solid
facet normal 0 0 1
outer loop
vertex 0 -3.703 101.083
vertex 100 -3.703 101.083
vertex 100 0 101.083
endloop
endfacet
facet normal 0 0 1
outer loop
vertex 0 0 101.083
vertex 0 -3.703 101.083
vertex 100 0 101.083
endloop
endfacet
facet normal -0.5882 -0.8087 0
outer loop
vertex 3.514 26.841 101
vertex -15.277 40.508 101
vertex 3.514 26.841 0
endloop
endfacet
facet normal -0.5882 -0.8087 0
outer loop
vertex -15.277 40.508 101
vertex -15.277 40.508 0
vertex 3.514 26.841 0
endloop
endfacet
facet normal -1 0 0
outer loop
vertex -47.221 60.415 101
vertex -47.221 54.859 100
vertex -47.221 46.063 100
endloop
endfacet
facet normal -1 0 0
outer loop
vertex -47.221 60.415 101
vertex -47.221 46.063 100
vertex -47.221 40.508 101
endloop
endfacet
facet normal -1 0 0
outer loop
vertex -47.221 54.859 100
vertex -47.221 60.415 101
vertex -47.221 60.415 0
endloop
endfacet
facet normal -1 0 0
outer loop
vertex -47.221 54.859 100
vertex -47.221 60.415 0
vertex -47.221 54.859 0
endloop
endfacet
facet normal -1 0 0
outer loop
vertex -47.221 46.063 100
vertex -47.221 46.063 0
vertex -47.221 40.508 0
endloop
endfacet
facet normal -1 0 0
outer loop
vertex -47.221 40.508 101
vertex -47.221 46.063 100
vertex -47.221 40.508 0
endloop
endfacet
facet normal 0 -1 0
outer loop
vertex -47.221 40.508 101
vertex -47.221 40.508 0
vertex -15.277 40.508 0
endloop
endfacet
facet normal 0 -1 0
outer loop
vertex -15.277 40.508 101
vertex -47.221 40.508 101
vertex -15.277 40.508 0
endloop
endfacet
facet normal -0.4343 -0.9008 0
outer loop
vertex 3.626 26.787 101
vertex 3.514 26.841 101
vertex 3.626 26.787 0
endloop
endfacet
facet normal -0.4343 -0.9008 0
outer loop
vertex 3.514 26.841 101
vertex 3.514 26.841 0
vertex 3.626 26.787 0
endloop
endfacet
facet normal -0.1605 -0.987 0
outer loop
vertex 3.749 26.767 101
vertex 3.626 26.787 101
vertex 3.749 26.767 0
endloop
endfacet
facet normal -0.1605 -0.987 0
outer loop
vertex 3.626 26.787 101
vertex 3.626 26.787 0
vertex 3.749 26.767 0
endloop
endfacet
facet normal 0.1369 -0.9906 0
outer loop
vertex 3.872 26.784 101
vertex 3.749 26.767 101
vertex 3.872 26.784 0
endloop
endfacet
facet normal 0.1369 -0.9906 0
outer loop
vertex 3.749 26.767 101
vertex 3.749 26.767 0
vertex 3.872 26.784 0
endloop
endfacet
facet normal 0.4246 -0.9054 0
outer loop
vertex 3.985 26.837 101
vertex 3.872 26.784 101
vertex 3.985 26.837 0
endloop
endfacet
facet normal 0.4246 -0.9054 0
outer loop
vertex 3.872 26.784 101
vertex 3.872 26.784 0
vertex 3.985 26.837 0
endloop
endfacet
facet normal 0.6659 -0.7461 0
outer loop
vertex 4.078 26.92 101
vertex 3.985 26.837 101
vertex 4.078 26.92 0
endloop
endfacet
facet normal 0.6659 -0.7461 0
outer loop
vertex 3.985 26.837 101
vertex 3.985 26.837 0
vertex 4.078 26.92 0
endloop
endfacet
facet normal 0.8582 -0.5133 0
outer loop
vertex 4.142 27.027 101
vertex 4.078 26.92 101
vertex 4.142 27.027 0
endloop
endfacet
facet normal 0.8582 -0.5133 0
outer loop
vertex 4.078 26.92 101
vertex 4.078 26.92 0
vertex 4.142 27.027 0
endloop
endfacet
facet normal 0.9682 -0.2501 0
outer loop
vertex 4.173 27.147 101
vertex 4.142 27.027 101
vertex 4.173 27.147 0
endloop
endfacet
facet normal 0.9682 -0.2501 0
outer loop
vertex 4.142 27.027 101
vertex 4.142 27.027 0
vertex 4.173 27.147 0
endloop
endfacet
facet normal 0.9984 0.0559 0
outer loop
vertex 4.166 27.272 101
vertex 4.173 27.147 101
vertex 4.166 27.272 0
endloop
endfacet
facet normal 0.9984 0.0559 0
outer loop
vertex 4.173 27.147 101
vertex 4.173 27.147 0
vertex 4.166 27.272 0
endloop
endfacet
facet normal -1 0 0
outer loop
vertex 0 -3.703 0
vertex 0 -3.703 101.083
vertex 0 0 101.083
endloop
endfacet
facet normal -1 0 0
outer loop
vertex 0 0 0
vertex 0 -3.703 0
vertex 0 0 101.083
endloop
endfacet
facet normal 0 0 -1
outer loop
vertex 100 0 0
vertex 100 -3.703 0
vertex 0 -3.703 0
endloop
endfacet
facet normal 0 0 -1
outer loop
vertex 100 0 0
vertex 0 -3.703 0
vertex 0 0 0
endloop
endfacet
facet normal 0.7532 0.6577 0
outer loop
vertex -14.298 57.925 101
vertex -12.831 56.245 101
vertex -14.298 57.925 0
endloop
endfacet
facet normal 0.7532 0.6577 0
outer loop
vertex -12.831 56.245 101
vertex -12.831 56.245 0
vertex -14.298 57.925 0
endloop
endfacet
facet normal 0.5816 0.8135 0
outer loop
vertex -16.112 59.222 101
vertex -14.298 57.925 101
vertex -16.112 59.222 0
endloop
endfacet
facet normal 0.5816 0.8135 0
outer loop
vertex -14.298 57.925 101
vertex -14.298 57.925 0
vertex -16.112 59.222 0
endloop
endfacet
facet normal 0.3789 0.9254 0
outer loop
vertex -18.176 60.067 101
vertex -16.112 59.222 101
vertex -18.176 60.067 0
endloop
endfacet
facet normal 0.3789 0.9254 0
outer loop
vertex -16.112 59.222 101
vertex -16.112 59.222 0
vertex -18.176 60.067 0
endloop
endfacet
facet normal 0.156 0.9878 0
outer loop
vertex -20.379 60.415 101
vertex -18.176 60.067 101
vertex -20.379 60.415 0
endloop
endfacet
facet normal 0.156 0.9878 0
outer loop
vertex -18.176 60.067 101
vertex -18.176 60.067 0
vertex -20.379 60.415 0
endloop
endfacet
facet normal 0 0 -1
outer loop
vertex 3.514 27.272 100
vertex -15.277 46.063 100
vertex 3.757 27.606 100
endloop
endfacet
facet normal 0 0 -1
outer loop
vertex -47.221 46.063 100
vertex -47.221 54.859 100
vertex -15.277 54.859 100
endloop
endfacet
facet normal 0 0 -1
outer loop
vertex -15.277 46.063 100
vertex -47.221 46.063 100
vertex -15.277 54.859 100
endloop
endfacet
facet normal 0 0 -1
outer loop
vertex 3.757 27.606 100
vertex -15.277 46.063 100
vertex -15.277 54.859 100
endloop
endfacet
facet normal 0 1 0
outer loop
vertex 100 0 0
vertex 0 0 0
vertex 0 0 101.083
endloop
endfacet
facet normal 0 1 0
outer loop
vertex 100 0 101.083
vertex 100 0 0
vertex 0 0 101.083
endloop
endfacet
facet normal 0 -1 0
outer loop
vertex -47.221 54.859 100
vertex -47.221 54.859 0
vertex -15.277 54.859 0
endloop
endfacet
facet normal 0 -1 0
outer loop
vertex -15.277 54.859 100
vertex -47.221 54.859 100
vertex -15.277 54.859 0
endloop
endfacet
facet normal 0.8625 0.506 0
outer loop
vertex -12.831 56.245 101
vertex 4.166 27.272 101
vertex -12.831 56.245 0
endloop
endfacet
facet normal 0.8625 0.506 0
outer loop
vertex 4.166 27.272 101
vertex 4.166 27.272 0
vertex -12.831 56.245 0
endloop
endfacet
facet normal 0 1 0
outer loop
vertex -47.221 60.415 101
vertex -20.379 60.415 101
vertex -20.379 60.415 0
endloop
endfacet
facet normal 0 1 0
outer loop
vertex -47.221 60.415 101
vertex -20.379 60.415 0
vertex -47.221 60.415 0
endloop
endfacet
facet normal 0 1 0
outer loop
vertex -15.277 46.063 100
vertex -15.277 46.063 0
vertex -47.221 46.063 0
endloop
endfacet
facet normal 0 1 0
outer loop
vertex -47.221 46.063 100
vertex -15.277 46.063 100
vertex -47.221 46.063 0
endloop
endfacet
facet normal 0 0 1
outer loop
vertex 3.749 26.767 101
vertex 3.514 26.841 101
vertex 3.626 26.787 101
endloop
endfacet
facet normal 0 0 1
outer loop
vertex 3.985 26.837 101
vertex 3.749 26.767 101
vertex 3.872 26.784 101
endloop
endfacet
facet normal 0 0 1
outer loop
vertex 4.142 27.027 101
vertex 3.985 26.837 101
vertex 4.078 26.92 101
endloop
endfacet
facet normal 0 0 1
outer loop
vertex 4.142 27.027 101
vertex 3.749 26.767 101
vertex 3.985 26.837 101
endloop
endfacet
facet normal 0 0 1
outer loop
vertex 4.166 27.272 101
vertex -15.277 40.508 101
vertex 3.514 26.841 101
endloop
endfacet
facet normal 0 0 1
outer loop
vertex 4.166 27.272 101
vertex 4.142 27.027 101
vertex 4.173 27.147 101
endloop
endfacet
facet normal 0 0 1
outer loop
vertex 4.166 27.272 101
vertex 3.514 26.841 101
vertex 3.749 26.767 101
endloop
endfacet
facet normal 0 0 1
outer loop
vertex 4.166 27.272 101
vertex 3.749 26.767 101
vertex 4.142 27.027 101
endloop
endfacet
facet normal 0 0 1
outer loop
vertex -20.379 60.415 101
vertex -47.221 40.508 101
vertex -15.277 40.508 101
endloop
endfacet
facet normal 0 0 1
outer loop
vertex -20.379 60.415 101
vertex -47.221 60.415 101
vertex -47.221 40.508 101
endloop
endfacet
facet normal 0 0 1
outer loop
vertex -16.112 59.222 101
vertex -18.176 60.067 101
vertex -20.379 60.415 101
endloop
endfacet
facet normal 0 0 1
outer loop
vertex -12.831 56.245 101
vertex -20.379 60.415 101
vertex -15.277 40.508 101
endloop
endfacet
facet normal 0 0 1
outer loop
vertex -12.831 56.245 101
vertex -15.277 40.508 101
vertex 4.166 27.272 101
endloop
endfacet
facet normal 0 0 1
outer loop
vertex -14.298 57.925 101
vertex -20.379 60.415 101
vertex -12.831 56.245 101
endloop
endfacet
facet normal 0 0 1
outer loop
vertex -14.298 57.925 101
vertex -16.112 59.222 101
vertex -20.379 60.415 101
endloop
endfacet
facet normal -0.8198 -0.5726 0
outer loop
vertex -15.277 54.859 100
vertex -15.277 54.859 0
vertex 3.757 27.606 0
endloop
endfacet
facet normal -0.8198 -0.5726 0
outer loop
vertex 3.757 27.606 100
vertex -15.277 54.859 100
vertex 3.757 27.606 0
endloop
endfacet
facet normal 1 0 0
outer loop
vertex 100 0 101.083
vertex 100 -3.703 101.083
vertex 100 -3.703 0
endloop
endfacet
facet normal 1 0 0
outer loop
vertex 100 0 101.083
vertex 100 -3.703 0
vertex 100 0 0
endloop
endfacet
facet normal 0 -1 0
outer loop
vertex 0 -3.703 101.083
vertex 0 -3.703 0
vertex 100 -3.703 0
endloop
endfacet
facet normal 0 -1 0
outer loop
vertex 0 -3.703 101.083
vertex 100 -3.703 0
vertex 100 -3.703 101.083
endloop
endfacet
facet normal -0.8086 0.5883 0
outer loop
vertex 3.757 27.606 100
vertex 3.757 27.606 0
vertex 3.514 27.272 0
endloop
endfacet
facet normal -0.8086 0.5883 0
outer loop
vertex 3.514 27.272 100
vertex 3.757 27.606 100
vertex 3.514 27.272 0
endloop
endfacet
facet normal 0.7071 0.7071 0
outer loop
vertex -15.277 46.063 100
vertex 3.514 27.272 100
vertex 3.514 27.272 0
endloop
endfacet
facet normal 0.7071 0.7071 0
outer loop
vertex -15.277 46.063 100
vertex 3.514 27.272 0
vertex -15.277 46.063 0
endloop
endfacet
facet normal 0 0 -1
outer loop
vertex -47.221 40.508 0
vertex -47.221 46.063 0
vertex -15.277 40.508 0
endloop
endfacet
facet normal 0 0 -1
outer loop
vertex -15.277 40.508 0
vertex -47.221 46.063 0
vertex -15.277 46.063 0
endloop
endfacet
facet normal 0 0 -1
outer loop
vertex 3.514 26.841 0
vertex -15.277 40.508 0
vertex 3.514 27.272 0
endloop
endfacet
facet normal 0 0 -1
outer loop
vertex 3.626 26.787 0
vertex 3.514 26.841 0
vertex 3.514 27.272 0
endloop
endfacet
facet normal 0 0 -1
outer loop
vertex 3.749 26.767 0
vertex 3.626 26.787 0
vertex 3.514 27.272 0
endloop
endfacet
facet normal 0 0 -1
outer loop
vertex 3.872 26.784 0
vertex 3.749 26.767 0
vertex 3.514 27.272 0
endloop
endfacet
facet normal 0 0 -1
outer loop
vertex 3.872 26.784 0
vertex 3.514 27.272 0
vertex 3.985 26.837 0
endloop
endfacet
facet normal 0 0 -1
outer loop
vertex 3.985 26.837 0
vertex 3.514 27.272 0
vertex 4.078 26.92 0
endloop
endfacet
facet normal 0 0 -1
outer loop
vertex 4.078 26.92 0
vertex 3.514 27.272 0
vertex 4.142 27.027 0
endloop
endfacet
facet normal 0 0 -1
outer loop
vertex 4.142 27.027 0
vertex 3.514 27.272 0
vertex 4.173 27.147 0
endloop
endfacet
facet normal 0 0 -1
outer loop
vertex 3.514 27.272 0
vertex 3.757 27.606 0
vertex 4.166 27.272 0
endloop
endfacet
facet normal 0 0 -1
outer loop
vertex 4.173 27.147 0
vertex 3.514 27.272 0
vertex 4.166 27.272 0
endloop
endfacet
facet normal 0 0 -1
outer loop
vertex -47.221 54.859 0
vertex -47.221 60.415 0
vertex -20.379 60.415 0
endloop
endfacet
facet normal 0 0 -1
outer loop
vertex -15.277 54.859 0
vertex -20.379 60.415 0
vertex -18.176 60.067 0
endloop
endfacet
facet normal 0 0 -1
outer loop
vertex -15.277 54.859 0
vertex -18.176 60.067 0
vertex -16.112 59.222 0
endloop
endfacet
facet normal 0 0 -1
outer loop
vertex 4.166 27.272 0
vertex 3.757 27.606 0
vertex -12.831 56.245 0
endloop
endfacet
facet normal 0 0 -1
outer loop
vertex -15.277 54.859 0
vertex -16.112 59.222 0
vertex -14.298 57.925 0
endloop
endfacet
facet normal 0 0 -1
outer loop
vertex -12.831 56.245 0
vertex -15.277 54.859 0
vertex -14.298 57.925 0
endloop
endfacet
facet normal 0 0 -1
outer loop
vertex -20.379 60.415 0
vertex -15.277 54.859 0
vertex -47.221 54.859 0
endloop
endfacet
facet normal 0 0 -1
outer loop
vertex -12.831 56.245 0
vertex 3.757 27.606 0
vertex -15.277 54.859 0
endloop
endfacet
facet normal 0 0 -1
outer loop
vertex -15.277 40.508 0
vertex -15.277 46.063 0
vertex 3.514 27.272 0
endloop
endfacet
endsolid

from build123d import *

# Parameters (mm, degrees)
F1_DEPTH = 100
F3_DEPTH = 1
F4_W     = 3.703487
F4_H     = 101.08342
F5_DEPTH = 100


with BuildPart() as f1:
    # F0 (on Top) → F1 (new body)
    with BuildSketch(Plane.XY):
        with BuildLine():
            Line((-15.27728, 46.063311), (-47.220681, 46.063311))
            Line((-47.220681, 46.063311), (-47.220681, 40.507939))
            Line((-47.220681, 40.507939), (-15.27728, 40.507939))
            Line((-15.27728, 40.507939), (3.514119, 26.841467))
            ThreePointArc((3.514119, 26.841467), (3.985413, 26.836768), (4.166487, 27.271915))
            Line((4.166487, 27.271915), (-12.831047, 56.244979))
            ThreePointArc((-12.831047, 56.244979), (-16.111954, 59.222238), (-20.378858, 60.414694))
            Line((-20.378858, 60.414694), (-47.220681, 60.414694))
            Line((-47.220681, 60.414694), (-47.220681, 54.859322))
            Line((-47.220681, 54.859322), (-15.27728, 54.859322))
            Line((-15.27728, 54.859322), (3.756936, 27.605788))
            Line((3.756936, 27.605788), (3.514119, 27.271915))
            Line((3.514119, 27.271915), (-15.27728, 46.063311))
        make_face()
    extrude(amount=F1_DEPTH)

    # F2 (on face) → F3 (join)
    with BuildSketch(Plane.XY.offset(100)):
        Polygon((-15.27728, 54.859322), (-47.220681, 54.859322), (-47.220681, 46.063311), (-15.27728, 46.063311), (3.514119, 27.271915), (3.756936, 27.605788), align=None)
        with BuildLine():
            Line((-20.378858, 60.414694), (-47.220681, 60.414694))
            Line((-47.220681, 60.414694), (-47.220681, 54.859322))
            Line((-47.220681, 54.859322), (-15.27728, 54.859322))
            Line((-15.27728, 54.859322), (3.756936, 27.605788))
            Line((3.756936, 27.605788), (3.514119, 27.271915))
            Line((3.514119, 27.271915), (-15.27728, 46.063311))
            Line((-15.27728, 46.063311), (-47.220681, 46.063311))
            Line((-47.220681, 46.063311), (-47.220681, 40.507939))
            Line((-47.220681, 40.507939), (-15.27728, 40.507939))
            Line((-15.27728, 40.507939), (3.514119, 26.841467))
            ThreePointArc((3.514119, 26.841467), (3.985413, 26.836768), (4.166487, 27.271915))
            Line((4.166487, 27.271915), (-12.831047, 56.244979))
            ThreePointArc((-12.831047, 56.244979), (-16.111954, 59.222238), (-20.378858, 60.414694))
        make_face()
    extrude(amount=F3_DEPTH)


with BuildPart() as f5:
    # F4 (on Right) → F5 (new body)
    with BuildSketch(Plane.YZ):
        with Locations((-1.851743, 50.54171)):
            Rectangle(F4_W, F4_H)
    extrude(amount=F5_DEPTH)


solid = Compound([f1.part, f5.part])
